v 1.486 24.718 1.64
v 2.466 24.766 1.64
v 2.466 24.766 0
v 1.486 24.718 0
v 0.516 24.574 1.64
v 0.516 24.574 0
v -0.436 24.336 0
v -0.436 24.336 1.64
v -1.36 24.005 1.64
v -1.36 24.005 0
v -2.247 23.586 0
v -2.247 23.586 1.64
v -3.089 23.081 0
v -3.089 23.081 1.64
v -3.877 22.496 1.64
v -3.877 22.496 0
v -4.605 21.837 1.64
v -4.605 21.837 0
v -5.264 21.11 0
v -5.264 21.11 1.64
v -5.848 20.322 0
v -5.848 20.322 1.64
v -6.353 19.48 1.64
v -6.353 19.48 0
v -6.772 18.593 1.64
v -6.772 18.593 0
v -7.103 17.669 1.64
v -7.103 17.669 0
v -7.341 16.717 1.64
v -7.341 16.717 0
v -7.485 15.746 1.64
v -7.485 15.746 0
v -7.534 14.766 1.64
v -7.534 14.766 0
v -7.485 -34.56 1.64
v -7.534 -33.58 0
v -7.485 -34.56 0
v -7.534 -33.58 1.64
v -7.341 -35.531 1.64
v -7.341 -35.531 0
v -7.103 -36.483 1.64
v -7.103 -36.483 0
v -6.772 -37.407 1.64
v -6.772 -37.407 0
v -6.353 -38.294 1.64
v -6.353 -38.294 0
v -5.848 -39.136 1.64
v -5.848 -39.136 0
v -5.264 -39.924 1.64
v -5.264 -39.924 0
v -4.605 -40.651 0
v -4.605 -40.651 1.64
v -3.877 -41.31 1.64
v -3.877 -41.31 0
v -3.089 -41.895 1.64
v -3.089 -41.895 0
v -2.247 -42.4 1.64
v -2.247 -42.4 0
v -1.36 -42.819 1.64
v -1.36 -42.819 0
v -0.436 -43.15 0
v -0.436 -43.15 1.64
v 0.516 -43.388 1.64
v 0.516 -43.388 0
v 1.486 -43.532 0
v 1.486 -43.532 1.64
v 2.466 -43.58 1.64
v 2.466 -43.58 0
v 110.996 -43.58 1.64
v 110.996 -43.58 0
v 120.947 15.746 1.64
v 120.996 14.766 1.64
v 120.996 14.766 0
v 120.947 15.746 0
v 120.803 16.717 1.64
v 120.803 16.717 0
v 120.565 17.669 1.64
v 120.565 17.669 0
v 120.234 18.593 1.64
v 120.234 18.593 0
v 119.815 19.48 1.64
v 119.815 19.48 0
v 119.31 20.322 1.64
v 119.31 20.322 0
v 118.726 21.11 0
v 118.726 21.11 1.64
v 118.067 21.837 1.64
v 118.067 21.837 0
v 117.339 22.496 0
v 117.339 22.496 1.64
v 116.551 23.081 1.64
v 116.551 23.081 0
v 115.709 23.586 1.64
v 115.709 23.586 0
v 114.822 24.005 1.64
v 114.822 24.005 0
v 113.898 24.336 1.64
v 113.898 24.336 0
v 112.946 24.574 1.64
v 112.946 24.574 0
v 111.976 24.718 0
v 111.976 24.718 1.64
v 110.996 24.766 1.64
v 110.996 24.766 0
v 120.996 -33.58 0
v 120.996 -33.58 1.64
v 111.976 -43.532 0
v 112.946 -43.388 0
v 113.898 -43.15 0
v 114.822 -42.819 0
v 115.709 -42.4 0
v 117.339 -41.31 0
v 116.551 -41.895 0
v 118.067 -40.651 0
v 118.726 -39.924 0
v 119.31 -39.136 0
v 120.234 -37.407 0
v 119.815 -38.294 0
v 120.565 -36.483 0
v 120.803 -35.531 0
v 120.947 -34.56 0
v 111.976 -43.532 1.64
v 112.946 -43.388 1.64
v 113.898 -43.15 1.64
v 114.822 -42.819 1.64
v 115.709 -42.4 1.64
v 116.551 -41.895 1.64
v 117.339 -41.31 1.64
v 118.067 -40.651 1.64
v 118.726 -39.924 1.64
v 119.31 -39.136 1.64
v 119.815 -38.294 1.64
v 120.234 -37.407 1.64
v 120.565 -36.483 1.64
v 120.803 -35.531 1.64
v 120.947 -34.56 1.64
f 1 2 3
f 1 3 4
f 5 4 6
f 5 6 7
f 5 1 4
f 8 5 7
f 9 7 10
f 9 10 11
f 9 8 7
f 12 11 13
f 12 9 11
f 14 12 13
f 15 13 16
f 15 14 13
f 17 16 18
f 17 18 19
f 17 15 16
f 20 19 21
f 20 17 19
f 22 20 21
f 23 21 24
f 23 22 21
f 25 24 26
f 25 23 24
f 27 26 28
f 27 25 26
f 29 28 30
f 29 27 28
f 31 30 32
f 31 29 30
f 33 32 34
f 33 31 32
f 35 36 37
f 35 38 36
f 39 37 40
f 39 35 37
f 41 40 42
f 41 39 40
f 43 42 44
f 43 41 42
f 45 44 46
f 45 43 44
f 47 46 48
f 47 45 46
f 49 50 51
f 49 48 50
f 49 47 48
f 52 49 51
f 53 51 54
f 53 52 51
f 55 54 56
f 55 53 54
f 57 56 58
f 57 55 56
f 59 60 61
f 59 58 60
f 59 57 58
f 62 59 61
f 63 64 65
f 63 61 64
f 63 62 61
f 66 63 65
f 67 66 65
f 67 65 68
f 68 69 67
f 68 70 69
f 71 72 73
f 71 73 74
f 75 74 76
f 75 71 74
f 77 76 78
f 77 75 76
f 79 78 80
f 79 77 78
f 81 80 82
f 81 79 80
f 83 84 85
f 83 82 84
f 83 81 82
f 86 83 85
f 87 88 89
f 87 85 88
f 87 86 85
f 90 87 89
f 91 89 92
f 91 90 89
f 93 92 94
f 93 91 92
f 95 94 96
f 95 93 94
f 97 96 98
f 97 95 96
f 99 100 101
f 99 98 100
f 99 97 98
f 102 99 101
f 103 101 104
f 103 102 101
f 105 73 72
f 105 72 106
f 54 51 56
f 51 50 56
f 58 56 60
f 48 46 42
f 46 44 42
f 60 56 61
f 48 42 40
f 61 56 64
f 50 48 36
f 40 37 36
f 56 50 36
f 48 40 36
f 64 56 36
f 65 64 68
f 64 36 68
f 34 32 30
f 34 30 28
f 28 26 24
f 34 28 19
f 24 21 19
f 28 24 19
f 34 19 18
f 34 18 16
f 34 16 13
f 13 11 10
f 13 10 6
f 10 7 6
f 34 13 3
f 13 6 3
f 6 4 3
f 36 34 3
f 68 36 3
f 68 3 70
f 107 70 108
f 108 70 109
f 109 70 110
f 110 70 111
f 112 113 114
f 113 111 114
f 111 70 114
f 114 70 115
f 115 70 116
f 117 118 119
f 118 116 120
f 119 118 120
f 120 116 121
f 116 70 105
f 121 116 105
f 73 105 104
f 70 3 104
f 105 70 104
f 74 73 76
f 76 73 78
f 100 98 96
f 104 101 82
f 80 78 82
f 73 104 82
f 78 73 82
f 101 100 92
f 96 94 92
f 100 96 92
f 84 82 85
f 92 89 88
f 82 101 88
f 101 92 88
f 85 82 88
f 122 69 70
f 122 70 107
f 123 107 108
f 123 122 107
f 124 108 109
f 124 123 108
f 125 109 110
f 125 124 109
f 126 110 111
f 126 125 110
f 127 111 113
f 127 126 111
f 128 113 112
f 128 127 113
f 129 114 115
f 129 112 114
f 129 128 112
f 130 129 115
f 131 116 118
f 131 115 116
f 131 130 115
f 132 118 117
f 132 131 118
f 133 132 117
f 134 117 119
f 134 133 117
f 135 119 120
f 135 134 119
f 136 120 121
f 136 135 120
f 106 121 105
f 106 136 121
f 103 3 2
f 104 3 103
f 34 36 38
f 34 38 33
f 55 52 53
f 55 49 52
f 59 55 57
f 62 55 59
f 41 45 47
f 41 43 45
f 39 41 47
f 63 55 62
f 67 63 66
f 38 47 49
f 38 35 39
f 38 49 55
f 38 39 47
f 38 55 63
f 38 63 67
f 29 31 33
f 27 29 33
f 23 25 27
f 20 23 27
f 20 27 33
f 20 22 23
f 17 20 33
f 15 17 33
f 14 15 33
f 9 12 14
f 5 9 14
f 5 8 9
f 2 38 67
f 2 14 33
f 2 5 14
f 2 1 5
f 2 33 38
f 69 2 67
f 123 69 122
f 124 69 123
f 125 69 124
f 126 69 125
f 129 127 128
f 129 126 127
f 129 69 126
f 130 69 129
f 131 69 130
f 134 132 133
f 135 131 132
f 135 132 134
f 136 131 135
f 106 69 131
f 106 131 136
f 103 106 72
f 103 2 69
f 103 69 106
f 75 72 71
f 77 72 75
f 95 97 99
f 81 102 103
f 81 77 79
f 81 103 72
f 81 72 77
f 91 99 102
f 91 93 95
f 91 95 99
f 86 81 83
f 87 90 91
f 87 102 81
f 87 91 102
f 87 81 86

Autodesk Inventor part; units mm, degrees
ref_plane "YZ Plane" through (0, 0, 0) normal (1, 0, 0) x (0, 1, 0)
ref_plane "XZ Plane" through (0, 0, 0) normal (0, 1, 0) x (-1, 0, 0)
ref_plane "XY Plane" through (0, 0, 0) normal (0, 0, 1) x (1, 0, 0)
sketch "Sketch1" plane through (0, 0, 0) normal (0, 0, 1) x (1, 0, 0)
  line L0 (-7.5335, 24.7663) -> (120.9955, 24.7663)
  line L1 (120.9955, 24.7663) -> (120.9955, -43.5803)
  line L2 (120.9955, -43.5803) -> (-7.5335, -43.5803)
  line L3 (-7.5335, -43.5803) -> (-7.5335, 24.7663)
  point P0 (0, 0)
extrude "Extrusion1" add sketch "Sketch1" along normal blind 1.64
fillet "Fillet1" radius 10 4 edges at (120.9955, 24.7663, 0.82) (120.9955, -43.5803, 0.82) (-7.5335, 24.7663, 0.82) (-7.5335, -43.5803, 0.82)
properties part number "perfboard"
